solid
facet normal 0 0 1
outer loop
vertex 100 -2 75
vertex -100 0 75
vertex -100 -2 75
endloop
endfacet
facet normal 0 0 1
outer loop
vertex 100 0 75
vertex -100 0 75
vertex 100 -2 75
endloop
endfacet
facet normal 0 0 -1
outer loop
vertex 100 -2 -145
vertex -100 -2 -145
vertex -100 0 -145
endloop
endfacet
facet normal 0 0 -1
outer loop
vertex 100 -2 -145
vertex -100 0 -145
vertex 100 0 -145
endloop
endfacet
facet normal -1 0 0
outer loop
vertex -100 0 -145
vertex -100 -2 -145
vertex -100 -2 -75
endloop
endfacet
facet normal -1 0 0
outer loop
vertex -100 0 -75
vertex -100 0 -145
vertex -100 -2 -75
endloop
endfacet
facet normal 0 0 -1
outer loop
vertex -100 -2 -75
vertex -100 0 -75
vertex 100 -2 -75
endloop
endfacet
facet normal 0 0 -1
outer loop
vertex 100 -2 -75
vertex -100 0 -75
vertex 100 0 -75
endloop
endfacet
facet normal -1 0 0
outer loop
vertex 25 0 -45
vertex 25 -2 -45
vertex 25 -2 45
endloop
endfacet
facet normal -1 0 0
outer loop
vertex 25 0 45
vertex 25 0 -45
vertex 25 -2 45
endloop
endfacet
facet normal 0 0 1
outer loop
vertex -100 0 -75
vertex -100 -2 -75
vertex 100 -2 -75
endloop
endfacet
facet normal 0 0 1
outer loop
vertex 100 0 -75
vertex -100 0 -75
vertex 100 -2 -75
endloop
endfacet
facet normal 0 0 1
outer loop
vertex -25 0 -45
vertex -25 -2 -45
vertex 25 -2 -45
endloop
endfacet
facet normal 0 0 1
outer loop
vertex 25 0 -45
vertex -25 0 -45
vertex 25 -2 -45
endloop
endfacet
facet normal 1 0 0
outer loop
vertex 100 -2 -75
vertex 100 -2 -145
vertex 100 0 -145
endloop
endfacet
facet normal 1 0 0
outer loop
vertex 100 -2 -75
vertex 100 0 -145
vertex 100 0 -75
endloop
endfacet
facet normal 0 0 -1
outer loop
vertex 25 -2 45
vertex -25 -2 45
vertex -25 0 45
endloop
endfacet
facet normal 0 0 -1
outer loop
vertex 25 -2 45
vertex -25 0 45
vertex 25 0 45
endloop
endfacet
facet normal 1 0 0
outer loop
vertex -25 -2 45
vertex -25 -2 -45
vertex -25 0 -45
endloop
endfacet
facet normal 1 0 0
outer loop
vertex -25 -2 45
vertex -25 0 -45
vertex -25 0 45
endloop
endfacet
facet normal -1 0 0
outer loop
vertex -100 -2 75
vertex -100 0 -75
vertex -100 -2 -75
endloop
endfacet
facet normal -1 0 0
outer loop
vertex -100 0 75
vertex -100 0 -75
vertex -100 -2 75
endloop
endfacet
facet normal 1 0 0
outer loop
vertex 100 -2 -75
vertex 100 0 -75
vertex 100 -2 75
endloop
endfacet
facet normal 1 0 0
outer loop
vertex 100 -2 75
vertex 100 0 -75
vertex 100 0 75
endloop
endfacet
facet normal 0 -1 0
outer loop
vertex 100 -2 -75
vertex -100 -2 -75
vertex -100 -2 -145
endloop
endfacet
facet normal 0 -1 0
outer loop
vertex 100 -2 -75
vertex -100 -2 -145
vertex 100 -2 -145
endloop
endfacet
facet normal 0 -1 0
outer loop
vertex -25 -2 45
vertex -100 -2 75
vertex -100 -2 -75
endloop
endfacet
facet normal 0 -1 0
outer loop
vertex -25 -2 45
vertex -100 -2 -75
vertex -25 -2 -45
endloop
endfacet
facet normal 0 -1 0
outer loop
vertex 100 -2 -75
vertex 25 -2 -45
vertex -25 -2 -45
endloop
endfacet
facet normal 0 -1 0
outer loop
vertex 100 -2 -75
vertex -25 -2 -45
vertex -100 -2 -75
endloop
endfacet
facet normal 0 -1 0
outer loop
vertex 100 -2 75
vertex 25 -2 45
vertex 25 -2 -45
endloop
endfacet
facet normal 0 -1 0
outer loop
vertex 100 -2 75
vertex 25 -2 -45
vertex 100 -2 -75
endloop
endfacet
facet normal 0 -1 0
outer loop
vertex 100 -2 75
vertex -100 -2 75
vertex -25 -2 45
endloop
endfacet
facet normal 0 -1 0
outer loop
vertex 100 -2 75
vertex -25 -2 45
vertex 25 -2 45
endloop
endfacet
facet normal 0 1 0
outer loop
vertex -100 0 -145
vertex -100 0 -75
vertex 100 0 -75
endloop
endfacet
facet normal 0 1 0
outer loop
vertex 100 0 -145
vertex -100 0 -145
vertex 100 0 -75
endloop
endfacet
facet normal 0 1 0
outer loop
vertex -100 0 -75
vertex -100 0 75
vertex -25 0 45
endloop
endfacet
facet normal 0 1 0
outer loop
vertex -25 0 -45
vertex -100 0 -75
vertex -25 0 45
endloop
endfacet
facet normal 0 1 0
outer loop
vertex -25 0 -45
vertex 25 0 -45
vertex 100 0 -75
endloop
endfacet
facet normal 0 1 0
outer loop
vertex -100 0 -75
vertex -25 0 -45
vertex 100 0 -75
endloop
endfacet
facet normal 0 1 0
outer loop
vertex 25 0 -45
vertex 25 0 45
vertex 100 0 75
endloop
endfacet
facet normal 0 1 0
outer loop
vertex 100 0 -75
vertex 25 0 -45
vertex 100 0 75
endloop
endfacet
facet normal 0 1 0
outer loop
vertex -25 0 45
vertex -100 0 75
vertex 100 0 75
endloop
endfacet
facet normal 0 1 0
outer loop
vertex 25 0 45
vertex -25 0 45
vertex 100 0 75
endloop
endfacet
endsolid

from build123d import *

# Parameters (mm, degrees)
F0_W     = 200
F0_H     = 150
F1_DEPTH = 2
F2_W     = 50
F2_H     = 90
F3_DEPTH = 2
F4_W     = 200
F4_H     = 70
F5_DEPTH = 2


with BuildPart() as f1:
    # F0 (on Front) → F1 (new body)
    with BuildSketch(Plane.XZ):
        Rectangle(F0_W, F0_H)
    extrude(amount=F1_DEPTH)

    # F2 (on face) → F3 (cut)
    with BuildSketch(Plane.XZ.offset(2)):
        Rectangle(F2_W, F2_H)
    extrude(amount=-F3_DEPTH, mode=Mode.SUBTRACT)


with BuildPart() as f5:
    # F4 (on face) → F5 (new body)
    with BuildSketch(Plane.XZ.offset(2)):
        with Locations((0, -110)):
            Rectangle(F4_W, F4_H)
    extrude(amount=-F5_DEPTH)


solid = Compound([f1.part, f5.part])
